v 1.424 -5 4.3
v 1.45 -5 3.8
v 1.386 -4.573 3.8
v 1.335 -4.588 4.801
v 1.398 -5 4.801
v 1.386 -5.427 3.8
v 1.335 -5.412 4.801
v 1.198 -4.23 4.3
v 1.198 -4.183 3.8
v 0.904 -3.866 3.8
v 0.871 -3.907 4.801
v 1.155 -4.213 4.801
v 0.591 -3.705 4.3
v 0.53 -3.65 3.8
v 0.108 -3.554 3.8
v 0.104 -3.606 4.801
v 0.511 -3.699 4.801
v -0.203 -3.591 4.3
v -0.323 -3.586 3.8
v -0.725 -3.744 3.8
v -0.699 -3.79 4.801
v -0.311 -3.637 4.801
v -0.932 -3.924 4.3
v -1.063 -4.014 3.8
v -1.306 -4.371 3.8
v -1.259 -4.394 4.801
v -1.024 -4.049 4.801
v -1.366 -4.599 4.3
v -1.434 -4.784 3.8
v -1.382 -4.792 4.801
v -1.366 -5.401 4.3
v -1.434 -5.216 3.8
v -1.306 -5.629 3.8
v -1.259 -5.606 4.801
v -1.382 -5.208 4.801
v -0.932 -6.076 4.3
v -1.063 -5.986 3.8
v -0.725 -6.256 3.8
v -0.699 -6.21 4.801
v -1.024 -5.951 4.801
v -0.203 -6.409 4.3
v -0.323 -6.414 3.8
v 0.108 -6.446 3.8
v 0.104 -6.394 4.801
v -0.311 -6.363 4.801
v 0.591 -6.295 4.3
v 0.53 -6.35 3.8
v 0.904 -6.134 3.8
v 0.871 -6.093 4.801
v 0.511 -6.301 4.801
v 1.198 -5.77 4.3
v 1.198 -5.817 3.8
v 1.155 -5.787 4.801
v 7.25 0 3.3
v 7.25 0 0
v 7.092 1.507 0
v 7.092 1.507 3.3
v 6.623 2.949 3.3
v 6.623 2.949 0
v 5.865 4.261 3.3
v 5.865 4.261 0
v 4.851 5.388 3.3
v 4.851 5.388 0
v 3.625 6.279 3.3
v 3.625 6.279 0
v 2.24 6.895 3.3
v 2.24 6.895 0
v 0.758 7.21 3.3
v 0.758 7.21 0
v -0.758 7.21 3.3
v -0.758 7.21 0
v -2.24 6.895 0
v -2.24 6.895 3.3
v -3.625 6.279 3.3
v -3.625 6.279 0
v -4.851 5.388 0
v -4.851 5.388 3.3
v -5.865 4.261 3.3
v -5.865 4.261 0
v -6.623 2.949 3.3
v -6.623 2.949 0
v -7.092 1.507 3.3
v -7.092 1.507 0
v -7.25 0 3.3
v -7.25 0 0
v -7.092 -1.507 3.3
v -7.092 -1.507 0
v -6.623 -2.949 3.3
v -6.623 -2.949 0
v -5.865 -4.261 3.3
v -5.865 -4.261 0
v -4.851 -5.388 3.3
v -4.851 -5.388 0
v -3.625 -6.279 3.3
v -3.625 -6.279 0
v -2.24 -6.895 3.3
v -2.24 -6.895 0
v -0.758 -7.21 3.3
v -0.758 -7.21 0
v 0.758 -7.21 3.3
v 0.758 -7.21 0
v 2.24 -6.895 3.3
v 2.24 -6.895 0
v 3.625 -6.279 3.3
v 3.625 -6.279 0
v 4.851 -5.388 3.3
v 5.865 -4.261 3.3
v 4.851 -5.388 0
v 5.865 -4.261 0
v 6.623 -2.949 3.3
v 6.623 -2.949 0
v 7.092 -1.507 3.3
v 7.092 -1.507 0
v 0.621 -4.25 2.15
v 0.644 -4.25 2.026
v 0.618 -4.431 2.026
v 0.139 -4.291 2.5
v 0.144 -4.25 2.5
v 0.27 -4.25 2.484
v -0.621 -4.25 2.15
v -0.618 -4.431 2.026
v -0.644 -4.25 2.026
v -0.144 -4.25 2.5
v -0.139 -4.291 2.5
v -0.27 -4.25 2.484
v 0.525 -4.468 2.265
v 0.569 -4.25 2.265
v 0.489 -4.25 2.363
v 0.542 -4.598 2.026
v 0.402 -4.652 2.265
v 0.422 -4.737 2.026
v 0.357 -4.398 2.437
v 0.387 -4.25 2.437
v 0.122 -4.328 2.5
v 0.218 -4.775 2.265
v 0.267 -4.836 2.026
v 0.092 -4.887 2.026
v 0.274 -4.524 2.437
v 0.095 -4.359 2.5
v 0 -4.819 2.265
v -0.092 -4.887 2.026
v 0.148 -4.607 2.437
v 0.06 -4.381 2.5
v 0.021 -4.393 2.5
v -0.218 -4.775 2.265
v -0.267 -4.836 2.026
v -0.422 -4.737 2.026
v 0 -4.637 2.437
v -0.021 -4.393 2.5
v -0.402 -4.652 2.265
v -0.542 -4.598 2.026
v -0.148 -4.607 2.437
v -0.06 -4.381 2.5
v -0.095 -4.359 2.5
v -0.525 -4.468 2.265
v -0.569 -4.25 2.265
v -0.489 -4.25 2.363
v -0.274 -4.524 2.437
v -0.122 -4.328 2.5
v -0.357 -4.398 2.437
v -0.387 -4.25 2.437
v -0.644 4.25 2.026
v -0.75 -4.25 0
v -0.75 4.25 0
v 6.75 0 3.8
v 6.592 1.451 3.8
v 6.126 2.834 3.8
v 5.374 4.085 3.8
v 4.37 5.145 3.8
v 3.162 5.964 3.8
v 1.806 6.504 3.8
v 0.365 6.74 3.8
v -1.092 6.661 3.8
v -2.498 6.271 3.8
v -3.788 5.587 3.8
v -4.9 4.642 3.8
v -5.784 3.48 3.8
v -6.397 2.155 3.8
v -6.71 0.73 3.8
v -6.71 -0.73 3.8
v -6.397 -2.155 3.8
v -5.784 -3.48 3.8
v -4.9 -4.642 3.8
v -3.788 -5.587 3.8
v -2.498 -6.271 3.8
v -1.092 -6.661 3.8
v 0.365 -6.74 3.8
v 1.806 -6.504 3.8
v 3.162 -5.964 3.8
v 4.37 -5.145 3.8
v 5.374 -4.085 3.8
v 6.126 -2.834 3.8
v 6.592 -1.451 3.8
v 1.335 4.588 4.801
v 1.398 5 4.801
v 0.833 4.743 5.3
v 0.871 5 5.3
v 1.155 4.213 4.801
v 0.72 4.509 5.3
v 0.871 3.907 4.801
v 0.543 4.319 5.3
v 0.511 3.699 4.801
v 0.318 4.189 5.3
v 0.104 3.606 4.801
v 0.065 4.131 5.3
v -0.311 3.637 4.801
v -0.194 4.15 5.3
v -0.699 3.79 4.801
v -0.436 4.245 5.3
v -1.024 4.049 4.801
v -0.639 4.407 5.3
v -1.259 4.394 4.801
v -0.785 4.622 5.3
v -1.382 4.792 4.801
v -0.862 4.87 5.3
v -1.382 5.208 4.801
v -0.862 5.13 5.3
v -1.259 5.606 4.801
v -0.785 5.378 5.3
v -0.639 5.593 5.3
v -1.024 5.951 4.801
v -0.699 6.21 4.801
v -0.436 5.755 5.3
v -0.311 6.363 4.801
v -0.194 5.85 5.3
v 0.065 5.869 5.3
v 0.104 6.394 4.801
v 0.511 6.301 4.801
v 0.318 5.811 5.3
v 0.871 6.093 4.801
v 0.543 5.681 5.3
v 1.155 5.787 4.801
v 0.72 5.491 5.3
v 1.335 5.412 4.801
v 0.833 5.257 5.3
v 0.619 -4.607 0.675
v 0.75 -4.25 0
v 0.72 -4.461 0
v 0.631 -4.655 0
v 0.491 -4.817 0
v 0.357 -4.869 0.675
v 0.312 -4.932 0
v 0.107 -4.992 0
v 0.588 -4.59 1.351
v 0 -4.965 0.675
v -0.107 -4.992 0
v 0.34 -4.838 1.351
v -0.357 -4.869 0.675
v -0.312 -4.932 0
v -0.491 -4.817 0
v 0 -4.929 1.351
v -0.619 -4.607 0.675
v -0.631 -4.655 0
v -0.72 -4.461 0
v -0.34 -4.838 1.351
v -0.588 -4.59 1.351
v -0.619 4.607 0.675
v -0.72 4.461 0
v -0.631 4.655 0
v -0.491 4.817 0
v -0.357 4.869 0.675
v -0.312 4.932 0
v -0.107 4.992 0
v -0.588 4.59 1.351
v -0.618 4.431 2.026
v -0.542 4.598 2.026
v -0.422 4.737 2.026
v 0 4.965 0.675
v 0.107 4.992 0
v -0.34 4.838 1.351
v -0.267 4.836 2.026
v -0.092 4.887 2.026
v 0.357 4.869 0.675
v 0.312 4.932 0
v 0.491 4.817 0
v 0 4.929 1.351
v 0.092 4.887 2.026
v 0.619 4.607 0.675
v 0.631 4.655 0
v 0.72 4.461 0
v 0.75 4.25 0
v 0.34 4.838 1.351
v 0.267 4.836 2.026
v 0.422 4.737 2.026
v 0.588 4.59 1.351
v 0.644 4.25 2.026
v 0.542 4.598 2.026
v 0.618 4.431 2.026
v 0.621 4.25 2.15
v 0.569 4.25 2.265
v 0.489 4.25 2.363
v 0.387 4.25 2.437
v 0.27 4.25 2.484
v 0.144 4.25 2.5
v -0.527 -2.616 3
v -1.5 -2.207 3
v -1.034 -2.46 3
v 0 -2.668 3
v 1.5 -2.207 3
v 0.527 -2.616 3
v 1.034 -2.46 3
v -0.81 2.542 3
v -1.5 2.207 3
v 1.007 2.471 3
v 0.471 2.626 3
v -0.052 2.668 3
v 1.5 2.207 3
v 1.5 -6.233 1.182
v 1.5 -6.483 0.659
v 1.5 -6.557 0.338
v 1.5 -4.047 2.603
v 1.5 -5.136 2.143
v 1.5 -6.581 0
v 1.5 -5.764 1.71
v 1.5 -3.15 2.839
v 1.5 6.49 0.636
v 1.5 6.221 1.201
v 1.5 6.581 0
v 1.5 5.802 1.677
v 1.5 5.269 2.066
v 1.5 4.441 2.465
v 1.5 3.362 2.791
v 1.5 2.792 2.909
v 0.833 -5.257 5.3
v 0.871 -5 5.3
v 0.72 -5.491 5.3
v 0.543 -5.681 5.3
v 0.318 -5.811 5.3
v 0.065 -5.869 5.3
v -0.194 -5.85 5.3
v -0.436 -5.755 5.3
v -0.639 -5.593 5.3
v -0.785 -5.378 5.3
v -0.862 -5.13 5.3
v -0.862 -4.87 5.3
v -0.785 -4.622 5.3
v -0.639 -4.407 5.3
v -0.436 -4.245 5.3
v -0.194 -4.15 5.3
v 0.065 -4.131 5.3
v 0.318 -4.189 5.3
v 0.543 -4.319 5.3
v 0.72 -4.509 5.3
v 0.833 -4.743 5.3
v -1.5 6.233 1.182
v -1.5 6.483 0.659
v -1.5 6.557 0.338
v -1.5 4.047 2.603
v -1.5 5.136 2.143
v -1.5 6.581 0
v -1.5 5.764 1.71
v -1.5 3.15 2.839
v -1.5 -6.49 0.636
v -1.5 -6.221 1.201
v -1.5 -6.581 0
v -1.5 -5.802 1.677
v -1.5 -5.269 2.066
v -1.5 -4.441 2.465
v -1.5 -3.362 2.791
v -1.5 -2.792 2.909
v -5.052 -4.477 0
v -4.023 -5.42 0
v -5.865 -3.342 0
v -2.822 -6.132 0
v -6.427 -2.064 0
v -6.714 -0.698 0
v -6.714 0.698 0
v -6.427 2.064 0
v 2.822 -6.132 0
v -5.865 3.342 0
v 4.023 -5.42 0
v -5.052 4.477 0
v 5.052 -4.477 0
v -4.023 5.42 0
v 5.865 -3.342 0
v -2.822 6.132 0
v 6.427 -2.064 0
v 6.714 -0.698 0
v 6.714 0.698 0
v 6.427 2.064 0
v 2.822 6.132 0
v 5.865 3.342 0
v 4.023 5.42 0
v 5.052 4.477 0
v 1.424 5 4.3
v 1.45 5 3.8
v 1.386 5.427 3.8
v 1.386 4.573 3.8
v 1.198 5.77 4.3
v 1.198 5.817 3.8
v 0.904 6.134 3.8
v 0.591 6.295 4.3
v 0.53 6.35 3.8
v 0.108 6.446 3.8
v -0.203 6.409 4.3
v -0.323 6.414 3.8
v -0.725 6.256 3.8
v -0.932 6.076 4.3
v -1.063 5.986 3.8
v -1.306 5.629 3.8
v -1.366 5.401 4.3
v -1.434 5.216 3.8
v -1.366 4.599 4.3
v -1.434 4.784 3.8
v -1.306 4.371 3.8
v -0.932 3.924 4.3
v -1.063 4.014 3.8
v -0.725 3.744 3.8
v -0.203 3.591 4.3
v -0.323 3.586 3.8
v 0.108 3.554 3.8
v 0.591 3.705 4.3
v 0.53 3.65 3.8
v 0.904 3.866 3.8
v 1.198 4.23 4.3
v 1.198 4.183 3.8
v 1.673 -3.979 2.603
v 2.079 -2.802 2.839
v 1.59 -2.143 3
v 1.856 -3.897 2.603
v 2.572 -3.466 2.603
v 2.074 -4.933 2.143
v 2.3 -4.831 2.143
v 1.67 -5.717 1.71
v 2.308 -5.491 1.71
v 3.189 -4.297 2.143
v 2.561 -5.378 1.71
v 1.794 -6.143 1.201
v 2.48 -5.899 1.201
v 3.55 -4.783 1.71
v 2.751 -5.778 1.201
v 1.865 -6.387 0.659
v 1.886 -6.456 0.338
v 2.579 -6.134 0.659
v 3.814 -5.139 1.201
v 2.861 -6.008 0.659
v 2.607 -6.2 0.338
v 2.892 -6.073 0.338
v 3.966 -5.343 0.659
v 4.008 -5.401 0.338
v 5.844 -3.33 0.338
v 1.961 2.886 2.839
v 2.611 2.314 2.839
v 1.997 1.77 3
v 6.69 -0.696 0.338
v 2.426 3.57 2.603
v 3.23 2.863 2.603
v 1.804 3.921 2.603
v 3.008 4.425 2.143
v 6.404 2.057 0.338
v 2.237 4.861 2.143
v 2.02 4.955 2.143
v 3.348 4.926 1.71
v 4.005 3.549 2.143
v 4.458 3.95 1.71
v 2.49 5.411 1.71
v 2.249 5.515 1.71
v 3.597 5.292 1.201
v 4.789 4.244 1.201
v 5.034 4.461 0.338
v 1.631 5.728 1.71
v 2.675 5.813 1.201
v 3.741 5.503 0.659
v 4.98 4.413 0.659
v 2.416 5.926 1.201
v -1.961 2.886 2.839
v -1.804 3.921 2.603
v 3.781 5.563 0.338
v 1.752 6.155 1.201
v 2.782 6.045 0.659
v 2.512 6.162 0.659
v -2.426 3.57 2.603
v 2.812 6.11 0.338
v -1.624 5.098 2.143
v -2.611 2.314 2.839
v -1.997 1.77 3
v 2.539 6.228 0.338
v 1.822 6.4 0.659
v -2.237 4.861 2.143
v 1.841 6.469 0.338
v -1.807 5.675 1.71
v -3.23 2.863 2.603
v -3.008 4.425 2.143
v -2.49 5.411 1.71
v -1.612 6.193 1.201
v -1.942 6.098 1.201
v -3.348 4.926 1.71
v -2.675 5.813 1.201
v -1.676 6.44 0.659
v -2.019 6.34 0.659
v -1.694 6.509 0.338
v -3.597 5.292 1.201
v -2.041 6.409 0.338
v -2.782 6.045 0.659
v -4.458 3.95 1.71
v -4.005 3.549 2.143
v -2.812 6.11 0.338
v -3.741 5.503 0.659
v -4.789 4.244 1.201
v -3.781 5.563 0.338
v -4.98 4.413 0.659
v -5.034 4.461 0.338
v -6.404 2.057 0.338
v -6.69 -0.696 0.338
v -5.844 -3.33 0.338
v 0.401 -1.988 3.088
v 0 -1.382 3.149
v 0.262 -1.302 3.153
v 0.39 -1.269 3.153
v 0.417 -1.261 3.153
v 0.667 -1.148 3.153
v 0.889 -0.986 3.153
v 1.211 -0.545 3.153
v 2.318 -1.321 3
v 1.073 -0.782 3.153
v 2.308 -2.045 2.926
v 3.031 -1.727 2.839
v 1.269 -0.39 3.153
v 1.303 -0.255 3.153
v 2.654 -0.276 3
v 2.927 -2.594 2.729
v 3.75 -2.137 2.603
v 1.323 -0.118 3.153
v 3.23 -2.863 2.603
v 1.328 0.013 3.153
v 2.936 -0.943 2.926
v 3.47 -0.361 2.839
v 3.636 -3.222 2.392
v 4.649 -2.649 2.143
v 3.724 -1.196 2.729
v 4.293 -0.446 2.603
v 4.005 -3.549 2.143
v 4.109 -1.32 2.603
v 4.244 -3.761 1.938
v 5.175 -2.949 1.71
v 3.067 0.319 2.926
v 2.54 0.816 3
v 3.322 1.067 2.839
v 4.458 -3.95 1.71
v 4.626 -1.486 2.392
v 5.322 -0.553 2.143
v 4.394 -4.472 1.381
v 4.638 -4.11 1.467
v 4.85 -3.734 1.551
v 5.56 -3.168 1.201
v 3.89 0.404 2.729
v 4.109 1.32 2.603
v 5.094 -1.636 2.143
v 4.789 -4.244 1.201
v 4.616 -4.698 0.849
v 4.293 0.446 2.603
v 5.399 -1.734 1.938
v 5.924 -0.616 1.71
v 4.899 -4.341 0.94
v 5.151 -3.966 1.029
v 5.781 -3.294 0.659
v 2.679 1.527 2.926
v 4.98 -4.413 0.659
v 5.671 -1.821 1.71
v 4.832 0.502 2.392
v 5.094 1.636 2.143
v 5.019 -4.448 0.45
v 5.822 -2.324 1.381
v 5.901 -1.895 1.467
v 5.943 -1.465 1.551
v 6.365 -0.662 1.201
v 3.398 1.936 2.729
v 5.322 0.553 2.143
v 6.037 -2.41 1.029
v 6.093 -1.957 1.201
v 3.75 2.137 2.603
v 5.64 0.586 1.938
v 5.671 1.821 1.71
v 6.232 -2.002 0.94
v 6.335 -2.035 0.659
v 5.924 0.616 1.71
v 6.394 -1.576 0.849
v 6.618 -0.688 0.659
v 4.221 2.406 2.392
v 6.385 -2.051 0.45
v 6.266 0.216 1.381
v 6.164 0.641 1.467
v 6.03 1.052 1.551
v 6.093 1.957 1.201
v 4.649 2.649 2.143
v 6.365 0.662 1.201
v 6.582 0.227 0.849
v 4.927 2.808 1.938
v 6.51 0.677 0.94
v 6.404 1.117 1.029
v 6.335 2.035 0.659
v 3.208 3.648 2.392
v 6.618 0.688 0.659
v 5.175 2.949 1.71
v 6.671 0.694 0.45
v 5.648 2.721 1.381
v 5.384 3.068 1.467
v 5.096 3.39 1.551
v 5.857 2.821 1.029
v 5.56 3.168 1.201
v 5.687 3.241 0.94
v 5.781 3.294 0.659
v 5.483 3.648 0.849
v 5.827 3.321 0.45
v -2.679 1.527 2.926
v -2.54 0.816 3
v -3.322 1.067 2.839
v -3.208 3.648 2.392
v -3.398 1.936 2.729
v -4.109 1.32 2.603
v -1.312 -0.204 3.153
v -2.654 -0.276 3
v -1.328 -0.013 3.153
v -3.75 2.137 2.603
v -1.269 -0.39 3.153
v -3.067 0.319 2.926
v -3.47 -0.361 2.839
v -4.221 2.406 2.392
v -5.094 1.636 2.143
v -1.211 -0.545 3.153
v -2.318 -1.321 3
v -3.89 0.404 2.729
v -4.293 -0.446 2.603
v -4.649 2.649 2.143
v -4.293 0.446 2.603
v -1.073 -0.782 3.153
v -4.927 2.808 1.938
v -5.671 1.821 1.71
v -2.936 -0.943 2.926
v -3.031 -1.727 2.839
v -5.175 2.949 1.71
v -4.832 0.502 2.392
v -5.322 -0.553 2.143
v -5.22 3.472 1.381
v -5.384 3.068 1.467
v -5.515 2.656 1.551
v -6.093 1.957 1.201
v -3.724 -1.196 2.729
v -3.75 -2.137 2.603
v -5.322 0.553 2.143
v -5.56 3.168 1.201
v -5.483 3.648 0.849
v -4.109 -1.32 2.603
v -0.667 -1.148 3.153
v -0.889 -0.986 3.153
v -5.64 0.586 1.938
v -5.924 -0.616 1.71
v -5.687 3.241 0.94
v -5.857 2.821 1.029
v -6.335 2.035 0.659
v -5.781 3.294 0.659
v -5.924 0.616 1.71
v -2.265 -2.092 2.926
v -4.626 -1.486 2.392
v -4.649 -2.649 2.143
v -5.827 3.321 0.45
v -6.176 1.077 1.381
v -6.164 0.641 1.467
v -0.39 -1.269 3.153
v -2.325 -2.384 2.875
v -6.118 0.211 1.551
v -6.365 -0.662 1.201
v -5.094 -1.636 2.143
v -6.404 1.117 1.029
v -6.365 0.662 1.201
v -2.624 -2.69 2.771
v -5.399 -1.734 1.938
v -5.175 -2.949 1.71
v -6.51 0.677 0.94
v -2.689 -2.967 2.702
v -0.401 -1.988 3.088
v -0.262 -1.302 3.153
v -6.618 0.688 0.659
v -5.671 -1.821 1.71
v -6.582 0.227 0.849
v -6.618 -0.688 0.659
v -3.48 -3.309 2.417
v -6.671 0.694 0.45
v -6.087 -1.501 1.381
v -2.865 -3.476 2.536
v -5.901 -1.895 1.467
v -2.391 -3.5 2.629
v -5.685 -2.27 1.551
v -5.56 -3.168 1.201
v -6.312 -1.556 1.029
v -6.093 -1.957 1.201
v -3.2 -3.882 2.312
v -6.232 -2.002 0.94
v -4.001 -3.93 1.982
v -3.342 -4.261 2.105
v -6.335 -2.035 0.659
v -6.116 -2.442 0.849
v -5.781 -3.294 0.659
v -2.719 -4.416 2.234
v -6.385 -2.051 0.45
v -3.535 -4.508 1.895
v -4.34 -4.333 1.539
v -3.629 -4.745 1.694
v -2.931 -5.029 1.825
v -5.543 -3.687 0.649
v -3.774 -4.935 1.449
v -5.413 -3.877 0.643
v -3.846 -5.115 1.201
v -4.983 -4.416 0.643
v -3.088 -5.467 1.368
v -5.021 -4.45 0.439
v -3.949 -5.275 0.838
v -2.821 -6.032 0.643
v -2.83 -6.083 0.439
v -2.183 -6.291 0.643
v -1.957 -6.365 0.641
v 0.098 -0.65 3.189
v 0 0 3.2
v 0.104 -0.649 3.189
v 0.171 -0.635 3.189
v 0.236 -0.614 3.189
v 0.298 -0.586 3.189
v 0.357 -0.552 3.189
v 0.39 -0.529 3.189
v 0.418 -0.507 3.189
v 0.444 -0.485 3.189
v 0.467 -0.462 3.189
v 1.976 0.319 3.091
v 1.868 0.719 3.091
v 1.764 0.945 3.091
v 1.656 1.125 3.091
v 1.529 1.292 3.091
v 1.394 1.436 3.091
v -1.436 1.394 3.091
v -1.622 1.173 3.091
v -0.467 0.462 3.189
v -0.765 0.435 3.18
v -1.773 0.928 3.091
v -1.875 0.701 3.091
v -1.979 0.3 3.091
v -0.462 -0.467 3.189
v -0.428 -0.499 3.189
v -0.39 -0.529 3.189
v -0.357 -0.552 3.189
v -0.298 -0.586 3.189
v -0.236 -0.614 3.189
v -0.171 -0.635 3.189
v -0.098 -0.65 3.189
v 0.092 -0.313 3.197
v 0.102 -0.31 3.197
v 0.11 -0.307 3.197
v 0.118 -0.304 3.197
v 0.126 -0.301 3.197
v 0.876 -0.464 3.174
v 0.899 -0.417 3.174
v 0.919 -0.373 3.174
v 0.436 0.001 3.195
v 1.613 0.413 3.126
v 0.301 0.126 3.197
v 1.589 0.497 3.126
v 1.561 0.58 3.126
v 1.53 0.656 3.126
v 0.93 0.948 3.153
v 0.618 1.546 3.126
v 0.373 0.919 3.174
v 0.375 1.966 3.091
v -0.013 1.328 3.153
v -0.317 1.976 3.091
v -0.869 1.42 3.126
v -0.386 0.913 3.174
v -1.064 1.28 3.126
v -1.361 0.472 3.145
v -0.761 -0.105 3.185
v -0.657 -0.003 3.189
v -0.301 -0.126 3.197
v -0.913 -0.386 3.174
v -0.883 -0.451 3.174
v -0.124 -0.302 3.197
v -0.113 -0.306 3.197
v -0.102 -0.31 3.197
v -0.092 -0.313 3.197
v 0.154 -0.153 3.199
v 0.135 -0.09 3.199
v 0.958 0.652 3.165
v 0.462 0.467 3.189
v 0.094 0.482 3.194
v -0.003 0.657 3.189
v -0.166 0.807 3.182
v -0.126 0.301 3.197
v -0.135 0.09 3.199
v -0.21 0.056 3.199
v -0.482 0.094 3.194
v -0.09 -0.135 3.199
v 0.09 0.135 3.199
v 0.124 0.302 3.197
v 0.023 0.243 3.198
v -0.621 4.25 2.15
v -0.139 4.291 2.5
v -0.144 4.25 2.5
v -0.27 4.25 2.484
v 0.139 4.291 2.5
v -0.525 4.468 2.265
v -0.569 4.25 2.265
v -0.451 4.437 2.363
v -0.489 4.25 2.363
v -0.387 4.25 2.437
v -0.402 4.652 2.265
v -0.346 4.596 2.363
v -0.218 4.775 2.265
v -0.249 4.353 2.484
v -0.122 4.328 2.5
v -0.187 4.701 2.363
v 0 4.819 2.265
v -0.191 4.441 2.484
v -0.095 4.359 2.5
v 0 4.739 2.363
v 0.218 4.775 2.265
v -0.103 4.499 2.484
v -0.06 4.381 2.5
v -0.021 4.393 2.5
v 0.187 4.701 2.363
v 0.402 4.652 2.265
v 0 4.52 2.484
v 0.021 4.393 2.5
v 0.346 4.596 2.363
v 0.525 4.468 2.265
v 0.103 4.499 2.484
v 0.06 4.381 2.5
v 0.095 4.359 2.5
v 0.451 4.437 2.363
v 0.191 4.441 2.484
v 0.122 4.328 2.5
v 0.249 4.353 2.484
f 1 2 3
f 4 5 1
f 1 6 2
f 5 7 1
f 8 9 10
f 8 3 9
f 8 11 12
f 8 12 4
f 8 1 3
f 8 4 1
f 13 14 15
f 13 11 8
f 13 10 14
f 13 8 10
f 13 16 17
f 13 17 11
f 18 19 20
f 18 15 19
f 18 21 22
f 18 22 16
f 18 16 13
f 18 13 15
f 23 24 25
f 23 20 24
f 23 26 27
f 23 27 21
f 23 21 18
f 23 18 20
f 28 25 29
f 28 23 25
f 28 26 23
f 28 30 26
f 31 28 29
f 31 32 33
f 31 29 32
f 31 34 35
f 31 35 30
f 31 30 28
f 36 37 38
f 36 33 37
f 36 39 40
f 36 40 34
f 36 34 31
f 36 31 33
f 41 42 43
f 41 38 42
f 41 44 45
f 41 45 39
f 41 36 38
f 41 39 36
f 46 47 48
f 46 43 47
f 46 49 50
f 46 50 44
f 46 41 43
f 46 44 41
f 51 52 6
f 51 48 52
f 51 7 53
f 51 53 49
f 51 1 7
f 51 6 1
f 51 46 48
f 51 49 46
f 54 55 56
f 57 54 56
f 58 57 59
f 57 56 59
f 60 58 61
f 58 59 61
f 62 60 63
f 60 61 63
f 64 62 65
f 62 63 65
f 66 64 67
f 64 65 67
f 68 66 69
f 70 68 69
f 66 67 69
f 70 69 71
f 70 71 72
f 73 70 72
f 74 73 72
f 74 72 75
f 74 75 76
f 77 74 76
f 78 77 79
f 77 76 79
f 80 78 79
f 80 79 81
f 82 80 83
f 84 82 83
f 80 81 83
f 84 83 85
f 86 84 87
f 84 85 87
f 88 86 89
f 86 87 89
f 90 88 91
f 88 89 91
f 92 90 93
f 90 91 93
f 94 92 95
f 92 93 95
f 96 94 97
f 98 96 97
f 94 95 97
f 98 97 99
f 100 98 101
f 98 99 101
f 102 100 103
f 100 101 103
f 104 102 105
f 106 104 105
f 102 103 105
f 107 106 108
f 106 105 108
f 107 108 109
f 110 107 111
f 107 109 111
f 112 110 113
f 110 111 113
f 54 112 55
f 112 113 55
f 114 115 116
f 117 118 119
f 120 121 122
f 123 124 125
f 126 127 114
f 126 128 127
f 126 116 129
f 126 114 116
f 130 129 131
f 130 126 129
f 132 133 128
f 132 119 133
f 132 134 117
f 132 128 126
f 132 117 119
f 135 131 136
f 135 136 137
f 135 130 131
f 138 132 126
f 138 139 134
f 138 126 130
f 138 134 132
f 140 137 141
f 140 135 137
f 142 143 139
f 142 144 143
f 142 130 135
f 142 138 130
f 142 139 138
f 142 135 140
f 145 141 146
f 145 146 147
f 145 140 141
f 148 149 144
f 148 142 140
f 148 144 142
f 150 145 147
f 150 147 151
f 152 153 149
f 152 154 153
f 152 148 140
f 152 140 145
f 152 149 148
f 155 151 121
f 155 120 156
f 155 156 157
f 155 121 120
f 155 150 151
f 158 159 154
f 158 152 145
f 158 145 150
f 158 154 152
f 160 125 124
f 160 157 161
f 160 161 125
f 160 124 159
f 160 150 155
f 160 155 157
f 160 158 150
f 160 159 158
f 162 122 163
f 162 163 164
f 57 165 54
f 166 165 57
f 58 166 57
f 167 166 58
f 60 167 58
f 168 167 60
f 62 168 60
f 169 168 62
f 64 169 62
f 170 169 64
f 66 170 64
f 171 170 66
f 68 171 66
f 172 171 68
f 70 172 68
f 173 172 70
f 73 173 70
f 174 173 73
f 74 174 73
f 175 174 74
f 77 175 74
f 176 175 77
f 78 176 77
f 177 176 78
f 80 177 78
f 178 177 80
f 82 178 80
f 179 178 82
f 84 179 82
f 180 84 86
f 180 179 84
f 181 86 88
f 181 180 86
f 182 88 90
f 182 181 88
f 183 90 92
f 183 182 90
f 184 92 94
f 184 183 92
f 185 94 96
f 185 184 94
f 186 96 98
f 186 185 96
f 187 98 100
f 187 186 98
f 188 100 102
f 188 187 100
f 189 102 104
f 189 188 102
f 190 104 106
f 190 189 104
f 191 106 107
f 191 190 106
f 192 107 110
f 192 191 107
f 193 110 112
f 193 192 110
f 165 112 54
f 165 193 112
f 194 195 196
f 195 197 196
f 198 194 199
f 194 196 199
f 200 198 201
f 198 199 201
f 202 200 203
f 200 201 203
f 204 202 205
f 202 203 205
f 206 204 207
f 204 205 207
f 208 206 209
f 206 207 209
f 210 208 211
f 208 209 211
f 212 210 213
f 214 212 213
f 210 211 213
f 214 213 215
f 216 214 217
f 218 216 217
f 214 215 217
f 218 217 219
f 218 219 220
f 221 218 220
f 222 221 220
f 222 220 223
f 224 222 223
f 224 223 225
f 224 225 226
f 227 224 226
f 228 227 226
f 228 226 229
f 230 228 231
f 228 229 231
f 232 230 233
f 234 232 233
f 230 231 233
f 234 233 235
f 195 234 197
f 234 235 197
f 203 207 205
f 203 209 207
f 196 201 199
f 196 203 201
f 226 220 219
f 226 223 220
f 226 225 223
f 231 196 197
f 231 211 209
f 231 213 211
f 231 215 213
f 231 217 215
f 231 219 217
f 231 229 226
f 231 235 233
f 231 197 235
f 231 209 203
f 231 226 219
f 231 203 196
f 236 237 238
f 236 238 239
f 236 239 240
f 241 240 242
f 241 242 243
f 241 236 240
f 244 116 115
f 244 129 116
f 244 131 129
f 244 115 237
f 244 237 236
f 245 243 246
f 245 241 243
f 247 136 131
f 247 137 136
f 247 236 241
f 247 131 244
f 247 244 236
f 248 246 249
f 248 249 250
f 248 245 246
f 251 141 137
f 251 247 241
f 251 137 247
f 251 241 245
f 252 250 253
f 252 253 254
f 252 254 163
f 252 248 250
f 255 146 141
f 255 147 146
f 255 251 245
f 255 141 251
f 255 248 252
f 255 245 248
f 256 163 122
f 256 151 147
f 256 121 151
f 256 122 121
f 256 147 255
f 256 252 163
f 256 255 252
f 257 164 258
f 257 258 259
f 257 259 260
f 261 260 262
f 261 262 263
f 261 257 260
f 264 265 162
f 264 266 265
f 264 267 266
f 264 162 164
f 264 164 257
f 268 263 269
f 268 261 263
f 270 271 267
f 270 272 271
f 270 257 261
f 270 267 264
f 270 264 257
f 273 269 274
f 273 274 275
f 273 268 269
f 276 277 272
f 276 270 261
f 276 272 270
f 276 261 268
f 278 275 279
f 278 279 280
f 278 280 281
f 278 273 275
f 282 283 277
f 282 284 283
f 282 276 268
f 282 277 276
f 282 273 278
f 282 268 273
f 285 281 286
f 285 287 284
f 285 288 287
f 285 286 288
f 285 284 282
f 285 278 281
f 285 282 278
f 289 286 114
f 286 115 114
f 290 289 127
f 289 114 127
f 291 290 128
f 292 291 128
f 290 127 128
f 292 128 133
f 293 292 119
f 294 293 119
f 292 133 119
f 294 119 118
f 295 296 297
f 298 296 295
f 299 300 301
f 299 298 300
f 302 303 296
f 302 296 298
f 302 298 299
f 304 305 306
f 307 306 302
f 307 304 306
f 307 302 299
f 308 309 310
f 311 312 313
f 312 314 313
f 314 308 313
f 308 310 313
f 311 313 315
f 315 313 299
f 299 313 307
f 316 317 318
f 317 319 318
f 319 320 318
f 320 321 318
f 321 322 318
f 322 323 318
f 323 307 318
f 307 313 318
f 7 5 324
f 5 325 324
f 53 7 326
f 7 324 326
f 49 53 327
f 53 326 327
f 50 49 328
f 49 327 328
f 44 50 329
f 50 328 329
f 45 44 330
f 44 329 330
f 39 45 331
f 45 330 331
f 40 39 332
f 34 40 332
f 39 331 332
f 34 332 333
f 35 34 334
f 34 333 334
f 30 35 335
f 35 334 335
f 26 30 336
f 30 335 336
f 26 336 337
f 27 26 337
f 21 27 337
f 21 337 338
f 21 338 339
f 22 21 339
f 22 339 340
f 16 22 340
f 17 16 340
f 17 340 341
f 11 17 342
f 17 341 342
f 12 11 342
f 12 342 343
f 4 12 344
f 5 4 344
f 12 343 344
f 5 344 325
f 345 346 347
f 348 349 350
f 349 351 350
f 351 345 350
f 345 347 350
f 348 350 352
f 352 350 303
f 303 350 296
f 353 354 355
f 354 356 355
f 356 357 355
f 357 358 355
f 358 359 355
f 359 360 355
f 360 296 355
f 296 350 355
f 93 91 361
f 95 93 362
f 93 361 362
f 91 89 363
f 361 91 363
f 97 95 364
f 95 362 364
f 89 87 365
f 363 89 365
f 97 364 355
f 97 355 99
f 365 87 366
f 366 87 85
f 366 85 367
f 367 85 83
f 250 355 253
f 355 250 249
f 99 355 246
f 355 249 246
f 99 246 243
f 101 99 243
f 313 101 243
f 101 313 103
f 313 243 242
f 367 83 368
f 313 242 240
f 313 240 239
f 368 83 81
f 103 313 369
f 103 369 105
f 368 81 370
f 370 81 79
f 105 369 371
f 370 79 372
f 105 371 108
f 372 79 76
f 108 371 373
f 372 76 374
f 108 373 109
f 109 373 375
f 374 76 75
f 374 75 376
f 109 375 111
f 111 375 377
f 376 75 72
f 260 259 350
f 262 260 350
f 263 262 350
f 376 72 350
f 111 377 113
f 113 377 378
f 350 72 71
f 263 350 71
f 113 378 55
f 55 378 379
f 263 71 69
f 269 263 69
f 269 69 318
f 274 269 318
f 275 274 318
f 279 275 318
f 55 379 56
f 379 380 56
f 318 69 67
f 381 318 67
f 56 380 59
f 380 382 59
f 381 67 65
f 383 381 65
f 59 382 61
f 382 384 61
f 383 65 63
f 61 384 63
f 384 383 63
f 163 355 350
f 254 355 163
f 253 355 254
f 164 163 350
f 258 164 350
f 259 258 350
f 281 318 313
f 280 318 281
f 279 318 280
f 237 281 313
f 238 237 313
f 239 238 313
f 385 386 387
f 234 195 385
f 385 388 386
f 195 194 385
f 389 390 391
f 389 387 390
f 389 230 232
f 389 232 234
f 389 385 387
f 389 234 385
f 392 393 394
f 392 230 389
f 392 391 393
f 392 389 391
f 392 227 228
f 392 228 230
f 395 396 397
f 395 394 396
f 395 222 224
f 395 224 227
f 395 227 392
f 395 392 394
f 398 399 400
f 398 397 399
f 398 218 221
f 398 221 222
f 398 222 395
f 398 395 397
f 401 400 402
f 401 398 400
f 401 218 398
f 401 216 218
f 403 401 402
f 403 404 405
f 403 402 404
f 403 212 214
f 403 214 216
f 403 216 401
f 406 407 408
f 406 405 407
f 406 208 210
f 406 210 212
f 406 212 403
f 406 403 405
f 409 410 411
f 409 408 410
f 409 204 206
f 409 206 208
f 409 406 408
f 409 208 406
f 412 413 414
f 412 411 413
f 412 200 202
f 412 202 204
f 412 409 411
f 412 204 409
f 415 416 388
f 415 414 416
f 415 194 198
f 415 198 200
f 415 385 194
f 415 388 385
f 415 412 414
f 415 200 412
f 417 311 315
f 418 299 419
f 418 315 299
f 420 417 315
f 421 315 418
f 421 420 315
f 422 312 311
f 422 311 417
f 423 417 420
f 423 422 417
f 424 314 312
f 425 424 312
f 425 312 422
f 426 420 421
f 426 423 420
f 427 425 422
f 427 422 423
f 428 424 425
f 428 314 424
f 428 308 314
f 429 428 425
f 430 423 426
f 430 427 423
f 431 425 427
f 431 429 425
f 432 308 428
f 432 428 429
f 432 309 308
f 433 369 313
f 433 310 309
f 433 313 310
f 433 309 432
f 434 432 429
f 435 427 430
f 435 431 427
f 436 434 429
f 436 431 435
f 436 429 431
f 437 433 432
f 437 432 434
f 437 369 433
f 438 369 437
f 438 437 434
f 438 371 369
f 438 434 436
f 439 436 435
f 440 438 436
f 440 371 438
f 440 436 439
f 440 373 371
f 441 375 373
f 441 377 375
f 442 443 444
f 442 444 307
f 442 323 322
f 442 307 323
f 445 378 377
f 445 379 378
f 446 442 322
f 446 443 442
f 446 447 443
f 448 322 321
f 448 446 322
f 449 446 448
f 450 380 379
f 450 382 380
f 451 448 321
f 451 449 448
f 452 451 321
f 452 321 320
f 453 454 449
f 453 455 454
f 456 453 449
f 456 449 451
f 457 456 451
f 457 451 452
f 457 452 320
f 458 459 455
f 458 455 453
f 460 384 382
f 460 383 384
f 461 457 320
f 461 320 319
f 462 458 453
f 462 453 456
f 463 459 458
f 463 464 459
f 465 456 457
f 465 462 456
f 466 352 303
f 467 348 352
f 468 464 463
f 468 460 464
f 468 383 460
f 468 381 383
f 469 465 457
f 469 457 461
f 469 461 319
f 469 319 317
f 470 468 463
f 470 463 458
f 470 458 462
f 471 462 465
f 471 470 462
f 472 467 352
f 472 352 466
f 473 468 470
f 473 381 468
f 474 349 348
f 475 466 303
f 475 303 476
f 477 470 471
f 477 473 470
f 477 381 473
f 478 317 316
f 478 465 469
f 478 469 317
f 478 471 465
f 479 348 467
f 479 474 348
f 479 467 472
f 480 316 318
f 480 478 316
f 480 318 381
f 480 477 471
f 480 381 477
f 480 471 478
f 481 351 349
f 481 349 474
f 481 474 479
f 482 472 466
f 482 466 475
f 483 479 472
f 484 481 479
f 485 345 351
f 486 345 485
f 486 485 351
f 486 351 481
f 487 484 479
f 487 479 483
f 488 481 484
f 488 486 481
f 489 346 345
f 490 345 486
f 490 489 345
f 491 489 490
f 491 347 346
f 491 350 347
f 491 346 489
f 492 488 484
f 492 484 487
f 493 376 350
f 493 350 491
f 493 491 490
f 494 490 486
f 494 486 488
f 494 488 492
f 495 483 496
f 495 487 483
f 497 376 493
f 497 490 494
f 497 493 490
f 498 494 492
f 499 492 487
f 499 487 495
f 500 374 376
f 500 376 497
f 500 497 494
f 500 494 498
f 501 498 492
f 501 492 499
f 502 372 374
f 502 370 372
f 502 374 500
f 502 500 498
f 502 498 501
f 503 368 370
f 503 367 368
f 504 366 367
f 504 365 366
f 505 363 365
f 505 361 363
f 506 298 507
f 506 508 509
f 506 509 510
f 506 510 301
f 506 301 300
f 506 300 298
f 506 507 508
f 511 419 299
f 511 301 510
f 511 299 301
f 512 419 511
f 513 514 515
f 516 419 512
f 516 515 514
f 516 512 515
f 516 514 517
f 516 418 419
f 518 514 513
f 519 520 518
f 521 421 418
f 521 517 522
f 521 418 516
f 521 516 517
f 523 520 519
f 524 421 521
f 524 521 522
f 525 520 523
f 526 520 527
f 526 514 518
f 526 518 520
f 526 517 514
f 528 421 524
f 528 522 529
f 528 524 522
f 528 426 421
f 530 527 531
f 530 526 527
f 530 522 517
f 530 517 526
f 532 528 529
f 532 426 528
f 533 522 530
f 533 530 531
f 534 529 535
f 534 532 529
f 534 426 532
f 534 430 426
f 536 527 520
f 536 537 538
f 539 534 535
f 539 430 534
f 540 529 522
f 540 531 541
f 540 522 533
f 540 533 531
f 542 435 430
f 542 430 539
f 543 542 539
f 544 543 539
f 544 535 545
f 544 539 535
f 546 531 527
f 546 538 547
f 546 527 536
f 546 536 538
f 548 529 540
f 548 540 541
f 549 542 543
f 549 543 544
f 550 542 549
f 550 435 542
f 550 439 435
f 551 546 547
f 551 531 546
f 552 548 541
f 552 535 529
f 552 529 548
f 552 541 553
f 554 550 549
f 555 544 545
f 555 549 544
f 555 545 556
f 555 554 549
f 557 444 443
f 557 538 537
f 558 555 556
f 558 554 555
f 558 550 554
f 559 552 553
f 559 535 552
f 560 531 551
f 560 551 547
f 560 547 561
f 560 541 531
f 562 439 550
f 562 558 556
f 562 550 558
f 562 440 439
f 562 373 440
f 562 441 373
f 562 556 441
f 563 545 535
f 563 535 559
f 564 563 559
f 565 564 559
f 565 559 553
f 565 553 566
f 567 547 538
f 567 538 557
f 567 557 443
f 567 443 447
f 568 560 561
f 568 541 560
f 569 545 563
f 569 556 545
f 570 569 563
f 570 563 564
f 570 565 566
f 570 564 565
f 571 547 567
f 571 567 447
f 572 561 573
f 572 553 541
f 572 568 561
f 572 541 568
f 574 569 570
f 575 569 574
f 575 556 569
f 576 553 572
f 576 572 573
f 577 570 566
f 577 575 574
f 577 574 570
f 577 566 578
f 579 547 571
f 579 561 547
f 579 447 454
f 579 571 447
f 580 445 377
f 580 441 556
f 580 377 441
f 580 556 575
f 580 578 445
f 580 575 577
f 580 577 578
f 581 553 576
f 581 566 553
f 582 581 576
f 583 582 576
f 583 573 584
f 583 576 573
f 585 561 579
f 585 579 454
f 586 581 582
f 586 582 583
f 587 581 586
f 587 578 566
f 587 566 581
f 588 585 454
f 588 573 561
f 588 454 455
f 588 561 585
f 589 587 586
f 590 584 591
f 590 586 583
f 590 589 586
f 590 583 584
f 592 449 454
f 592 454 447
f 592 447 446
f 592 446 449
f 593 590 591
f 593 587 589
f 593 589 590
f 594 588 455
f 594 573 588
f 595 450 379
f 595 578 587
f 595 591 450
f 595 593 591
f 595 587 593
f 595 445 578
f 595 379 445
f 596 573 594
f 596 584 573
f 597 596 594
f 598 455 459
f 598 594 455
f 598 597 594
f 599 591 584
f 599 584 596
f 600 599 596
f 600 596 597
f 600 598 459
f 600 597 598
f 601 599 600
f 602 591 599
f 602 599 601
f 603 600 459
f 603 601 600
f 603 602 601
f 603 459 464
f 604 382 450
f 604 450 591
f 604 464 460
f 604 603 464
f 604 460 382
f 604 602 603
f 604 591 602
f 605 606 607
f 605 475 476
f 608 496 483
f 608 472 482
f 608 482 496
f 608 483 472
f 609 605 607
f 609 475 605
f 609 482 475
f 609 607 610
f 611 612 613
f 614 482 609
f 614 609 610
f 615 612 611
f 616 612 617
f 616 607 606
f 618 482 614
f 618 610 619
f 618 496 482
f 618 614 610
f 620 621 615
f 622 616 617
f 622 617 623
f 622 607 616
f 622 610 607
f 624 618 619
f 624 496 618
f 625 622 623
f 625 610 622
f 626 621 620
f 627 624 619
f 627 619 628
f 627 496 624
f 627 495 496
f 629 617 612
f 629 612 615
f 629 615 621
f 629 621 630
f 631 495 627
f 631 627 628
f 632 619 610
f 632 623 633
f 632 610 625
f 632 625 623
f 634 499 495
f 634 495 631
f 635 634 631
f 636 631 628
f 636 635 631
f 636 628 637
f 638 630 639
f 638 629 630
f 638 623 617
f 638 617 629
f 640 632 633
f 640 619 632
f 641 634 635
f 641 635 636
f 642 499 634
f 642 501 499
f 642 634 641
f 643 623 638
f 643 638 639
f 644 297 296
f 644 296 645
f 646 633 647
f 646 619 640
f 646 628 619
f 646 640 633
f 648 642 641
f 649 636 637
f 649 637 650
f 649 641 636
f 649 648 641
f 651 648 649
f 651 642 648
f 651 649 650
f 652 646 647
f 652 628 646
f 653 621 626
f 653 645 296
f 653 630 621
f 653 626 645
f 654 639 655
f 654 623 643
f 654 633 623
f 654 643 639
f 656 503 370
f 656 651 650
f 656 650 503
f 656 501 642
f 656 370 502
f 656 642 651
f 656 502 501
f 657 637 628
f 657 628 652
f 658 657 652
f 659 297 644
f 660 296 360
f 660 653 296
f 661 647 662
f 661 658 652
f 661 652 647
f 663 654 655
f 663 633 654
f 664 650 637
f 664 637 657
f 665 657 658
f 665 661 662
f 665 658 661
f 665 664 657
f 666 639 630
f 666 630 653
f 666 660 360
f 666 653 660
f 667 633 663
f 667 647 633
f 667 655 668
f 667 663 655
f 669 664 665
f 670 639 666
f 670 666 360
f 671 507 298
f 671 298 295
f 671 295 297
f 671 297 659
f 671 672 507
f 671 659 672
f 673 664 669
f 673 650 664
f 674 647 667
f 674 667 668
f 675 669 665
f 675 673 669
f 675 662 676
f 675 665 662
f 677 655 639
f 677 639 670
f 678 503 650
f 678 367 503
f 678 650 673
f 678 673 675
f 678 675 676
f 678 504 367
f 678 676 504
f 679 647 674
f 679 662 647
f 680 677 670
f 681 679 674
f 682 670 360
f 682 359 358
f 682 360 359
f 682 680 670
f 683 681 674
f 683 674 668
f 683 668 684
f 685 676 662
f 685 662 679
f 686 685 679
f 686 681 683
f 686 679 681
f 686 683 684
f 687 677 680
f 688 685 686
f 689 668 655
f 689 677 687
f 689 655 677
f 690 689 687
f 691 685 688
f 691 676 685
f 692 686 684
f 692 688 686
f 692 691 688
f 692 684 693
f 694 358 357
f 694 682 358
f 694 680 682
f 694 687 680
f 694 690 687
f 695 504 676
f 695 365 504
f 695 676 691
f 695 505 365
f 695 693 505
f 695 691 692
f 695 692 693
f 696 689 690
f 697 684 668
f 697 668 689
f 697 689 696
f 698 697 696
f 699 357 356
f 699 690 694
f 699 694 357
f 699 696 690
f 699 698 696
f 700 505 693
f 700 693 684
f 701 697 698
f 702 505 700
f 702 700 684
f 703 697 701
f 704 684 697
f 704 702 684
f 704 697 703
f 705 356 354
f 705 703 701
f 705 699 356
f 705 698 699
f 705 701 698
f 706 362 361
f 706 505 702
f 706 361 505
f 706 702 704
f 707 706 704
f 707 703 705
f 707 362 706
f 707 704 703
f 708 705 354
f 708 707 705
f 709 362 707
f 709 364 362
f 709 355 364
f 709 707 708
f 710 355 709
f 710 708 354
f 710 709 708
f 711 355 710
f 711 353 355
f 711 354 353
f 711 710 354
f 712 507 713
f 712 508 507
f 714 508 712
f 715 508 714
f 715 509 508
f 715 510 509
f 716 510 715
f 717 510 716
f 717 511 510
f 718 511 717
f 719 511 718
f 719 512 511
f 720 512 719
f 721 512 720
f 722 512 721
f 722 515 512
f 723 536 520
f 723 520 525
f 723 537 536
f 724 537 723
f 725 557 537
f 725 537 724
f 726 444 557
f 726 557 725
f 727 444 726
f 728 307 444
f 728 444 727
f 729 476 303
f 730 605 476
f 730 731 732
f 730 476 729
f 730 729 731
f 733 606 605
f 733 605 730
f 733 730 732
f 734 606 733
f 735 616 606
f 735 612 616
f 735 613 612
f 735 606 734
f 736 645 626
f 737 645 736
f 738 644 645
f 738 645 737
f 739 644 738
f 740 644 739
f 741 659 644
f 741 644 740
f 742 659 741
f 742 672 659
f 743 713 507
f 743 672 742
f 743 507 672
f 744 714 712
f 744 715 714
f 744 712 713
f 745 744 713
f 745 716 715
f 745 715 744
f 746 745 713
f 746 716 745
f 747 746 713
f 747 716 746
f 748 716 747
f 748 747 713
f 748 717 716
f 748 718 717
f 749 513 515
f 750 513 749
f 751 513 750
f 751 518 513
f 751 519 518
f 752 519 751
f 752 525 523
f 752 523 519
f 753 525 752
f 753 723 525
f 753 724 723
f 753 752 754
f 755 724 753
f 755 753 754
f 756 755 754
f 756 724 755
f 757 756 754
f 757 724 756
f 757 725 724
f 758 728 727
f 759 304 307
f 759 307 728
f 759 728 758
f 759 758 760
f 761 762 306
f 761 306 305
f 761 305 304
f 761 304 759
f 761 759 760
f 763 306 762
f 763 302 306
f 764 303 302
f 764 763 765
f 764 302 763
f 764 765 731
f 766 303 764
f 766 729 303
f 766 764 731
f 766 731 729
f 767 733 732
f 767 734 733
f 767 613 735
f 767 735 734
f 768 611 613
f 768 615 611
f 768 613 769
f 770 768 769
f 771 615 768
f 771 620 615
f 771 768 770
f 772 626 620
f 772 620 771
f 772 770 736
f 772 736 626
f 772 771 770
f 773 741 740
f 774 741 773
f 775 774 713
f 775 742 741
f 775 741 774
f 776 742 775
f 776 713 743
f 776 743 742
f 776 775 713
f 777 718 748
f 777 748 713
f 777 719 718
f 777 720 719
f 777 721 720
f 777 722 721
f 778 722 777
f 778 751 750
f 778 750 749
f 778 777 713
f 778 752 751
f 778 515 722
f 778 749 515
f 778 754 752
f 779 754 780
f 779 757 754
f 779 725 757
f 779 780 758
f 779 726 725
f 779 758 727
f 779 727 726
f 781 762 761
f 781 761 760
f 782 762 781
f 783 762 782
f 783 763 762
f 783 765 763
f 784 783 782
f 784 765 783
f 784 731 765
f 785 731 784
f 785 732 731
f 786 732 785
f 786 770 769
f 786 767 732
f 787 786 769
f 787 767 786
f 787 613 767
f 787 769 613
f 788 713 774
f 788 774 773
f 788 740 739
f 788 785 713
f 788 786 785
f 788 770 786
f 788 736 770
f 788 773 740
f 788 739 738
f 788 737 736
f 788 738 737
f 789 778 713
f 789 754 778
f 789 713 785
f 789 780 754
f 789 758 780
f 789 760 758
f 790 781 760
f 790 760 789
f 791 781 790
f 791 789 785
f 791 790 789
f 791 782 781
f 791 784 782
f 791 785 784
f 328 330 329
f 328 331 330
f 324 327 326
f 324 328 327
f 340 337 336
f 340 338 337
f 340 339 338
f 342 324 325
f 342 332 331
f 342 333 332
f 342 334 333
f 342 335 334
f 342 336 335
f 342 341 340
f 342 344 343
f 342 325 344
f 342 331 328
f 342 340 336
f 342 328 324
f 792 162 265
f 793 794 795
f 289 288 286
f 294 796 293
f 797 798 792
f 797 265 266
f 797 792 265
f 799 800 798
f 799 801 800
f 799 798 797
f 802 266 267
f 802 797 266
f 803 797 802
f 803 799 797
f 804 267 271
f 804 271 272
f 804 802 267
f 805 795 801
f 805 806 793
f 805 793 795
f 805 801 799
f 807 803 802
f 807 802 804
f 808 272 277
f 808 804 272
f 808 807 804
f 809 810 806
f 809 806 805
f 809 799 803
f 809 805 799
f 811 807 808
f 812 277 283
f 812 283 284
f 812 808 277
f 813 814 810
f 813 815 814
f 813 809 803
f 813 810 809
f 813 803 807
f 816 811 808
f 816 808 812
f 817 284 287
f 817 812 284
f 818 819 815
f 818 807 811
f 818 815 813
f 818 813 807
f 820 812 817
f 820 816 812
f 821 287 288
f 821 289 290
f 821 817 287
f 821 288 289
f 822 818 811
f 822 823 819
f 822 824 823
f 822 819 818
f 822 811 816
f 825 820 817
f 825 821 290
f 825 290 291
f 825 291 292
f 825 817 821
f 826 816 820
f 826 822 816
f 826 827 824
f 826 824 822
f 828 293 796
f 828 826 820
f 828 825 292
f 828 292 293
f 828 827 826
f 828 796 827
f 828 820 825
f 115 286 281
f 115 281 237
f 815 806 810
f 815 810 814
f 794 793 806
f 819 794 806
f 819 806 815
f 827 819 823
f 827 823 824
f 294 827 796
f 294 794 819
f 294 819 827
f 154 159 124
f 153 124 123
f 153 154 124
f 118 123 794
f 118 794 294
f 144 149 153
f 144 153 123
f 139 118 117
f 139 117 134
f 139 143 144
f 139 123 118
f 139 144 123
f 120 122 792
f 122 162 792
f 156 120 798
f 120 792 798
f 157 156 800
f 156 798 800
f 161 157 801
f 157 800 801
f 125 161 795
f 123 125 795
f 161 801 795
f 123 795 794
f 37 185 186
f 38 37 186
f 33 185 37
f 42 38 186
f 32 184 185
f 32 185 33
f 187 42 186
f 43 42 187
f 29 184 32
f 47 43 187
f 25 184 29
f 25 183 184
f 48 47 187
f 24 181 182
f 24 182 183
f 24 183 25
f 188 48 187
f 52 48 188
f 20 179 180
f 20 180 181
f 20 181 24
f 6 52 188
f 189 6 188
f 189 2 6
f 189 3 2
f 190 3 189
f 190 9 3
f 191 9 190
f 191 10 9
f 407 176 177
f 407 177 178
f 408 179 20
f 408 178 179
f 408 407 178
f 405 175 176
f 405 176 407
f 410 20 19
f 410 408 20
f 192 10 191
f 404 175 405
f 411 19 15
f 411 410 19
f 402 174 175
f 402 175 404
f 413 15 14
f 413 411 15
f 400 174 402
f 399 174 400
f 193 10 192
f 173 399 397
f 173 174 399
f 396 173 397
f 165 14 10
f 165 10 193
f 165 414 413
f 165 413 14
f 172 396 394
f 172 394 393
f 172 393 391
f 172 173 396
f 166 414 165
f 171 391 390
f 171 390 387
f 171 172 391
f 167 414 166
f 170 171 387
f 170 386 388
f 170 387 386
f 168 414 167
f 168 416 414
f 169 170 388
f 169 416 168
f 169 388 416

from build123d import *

# Parameters (mm, degrees)
F0_R      = 7.25
F1_DEPTH  = 3.8
F2_R      = 1.45
F3_DEPTH  = 1.5
F3_TAPER  = 3
F8_DEPTH  = 3
F10_DEPTH = 2.5
F10_TAPER = 3
F11_R     = 0.5
F12_SIZE  = 0.5


# Not quite as in the source:
# - a fillet or chamfer that OpenCascade refuses, or shapes differently, is made with other operations: its cross-section is extruded or revolved along the edge and cut away or added


with BuildPart() as f1:
    # F0 (on Top) → F1 (new body)
    with BuildSketch(Plane.XY):
        Circle(F0_R)
    extrude(amount=F1_DEPTH)

    # F2 (on face) → F3 (join)
    with BuildSketch(Plane.XY.offset(3.8)):
        with Locations((0, 5)):
            Circle(F2_R)
        with Locations((0, -5)):
            Circle(F2_R)
    extrude(amount=F3_DEPTH, taper=F3_TAPER)

    # F4: chamfer of 0.5 on 2 edges, made by hand

    # F4_s1 → F4_t2 (revolve, cut)
    with BuildSketch(Plane.XZ.offset(-5)):
        Polygon((1.3975563092, 4.8006852326), (0.8713883311, 5.3), (1.3713883311, 5.3), align=None)
    revolve(axis=Axis((0, 5, 5.3), (0, 0, -1)), mode=Mode.SUBTRACT)

    # F4_s3 → F4_t4 (revolve, cut)
    with BuildSketch(Plane.XZ.offset(5)):
        Polygon((1.3975563092, 4.8006852326), (0.8713883311, 5.3), (1.3713883311, 5.3), align=None)
    revolve(axis=Axis((0, -5, 5.3), (0, 0, -1)), mode=Mode.SUBTRACT)

    # F5 (on Right) → F6 (revolve, cut)
    with BuildSketch(Plane.YZ):
        with BuildLine():
            add(Edge.make_bspline(
                [(0, 3.2), (-3, 3.2), (-6.75, 2.5), (-6.75, 0)],
                knots=[0, 0, 0, 0, 7.4701070943, 7.4701070943, 7.4701070943, 7.4701070943], degree=3))
            Line((-6.75, 0), (0, 0))
            Line((0, 0), (0, 3.2))
        make_face()
    revolve(axis=Axis((0, 0, 2.9542176053), (0, 0, 1)), mode=Mode.SUBTRACT)

    # F7 (on face) → F8 (join)
    with BuildSketch(Plane.XY):
        with BuildLine():
            Line((-1.5, 6.5812232905), (-1.5, -6.5812232905))
            ThreePointArc((-1.5, -6.5812232905), (0, -6.75), (1.5, -6.5812232905))
            Line((1.5, -6.5812232905), (1.5, 6.5812232905))
            ThreePointArc((1.5, 6.5812232905), (0, 6.75), (-1.5, 6.5812232905))
        make_face()
    extrude(amount=F8_DEPTH)

    # F9 (on face) → F10 (cut)
    with BuildSketch(Plane(origin=(0, 0, 0), x_dir=(1, 0, 0), z_dir=(0, 0, -1))):
        with BuildLine():
            ThreePointArc((0.75, 4.25), (0, 5), (-0.75, 4.25))
            Line((-0.75, 4.25), (-0.75, -4.25))
            ThreePointArc((-0.75, -4.25), (0, -5), (0.75, -4.25))
            Line((0.75, -4.25), (0.75, 4.25))
        make_face()
    extrude(amount=-F10_DEPTH, taper=F10_TAPER, mode=Mode.SUBTRACT)

    # F11
    f11_edges = [f1.edges().sort_by_distance(p)[0] for p in [
        (0, -4.868981, 2.5),
        (-0.618981, 0, 2.5),
        (0, 4.868981, 2.5),
        (0.618981, 0, 2.5),
    ]]
    fillet(f11_edges, radius=F11_R)

    # F12
    f12_edges = [f1.edges().sort_by_distance(p)[0] for p in [
        (-7.25, 0, 3.8),
    ]]
    chamfer(f12_edges, length=F12_SIZE)


solid = f1.part
